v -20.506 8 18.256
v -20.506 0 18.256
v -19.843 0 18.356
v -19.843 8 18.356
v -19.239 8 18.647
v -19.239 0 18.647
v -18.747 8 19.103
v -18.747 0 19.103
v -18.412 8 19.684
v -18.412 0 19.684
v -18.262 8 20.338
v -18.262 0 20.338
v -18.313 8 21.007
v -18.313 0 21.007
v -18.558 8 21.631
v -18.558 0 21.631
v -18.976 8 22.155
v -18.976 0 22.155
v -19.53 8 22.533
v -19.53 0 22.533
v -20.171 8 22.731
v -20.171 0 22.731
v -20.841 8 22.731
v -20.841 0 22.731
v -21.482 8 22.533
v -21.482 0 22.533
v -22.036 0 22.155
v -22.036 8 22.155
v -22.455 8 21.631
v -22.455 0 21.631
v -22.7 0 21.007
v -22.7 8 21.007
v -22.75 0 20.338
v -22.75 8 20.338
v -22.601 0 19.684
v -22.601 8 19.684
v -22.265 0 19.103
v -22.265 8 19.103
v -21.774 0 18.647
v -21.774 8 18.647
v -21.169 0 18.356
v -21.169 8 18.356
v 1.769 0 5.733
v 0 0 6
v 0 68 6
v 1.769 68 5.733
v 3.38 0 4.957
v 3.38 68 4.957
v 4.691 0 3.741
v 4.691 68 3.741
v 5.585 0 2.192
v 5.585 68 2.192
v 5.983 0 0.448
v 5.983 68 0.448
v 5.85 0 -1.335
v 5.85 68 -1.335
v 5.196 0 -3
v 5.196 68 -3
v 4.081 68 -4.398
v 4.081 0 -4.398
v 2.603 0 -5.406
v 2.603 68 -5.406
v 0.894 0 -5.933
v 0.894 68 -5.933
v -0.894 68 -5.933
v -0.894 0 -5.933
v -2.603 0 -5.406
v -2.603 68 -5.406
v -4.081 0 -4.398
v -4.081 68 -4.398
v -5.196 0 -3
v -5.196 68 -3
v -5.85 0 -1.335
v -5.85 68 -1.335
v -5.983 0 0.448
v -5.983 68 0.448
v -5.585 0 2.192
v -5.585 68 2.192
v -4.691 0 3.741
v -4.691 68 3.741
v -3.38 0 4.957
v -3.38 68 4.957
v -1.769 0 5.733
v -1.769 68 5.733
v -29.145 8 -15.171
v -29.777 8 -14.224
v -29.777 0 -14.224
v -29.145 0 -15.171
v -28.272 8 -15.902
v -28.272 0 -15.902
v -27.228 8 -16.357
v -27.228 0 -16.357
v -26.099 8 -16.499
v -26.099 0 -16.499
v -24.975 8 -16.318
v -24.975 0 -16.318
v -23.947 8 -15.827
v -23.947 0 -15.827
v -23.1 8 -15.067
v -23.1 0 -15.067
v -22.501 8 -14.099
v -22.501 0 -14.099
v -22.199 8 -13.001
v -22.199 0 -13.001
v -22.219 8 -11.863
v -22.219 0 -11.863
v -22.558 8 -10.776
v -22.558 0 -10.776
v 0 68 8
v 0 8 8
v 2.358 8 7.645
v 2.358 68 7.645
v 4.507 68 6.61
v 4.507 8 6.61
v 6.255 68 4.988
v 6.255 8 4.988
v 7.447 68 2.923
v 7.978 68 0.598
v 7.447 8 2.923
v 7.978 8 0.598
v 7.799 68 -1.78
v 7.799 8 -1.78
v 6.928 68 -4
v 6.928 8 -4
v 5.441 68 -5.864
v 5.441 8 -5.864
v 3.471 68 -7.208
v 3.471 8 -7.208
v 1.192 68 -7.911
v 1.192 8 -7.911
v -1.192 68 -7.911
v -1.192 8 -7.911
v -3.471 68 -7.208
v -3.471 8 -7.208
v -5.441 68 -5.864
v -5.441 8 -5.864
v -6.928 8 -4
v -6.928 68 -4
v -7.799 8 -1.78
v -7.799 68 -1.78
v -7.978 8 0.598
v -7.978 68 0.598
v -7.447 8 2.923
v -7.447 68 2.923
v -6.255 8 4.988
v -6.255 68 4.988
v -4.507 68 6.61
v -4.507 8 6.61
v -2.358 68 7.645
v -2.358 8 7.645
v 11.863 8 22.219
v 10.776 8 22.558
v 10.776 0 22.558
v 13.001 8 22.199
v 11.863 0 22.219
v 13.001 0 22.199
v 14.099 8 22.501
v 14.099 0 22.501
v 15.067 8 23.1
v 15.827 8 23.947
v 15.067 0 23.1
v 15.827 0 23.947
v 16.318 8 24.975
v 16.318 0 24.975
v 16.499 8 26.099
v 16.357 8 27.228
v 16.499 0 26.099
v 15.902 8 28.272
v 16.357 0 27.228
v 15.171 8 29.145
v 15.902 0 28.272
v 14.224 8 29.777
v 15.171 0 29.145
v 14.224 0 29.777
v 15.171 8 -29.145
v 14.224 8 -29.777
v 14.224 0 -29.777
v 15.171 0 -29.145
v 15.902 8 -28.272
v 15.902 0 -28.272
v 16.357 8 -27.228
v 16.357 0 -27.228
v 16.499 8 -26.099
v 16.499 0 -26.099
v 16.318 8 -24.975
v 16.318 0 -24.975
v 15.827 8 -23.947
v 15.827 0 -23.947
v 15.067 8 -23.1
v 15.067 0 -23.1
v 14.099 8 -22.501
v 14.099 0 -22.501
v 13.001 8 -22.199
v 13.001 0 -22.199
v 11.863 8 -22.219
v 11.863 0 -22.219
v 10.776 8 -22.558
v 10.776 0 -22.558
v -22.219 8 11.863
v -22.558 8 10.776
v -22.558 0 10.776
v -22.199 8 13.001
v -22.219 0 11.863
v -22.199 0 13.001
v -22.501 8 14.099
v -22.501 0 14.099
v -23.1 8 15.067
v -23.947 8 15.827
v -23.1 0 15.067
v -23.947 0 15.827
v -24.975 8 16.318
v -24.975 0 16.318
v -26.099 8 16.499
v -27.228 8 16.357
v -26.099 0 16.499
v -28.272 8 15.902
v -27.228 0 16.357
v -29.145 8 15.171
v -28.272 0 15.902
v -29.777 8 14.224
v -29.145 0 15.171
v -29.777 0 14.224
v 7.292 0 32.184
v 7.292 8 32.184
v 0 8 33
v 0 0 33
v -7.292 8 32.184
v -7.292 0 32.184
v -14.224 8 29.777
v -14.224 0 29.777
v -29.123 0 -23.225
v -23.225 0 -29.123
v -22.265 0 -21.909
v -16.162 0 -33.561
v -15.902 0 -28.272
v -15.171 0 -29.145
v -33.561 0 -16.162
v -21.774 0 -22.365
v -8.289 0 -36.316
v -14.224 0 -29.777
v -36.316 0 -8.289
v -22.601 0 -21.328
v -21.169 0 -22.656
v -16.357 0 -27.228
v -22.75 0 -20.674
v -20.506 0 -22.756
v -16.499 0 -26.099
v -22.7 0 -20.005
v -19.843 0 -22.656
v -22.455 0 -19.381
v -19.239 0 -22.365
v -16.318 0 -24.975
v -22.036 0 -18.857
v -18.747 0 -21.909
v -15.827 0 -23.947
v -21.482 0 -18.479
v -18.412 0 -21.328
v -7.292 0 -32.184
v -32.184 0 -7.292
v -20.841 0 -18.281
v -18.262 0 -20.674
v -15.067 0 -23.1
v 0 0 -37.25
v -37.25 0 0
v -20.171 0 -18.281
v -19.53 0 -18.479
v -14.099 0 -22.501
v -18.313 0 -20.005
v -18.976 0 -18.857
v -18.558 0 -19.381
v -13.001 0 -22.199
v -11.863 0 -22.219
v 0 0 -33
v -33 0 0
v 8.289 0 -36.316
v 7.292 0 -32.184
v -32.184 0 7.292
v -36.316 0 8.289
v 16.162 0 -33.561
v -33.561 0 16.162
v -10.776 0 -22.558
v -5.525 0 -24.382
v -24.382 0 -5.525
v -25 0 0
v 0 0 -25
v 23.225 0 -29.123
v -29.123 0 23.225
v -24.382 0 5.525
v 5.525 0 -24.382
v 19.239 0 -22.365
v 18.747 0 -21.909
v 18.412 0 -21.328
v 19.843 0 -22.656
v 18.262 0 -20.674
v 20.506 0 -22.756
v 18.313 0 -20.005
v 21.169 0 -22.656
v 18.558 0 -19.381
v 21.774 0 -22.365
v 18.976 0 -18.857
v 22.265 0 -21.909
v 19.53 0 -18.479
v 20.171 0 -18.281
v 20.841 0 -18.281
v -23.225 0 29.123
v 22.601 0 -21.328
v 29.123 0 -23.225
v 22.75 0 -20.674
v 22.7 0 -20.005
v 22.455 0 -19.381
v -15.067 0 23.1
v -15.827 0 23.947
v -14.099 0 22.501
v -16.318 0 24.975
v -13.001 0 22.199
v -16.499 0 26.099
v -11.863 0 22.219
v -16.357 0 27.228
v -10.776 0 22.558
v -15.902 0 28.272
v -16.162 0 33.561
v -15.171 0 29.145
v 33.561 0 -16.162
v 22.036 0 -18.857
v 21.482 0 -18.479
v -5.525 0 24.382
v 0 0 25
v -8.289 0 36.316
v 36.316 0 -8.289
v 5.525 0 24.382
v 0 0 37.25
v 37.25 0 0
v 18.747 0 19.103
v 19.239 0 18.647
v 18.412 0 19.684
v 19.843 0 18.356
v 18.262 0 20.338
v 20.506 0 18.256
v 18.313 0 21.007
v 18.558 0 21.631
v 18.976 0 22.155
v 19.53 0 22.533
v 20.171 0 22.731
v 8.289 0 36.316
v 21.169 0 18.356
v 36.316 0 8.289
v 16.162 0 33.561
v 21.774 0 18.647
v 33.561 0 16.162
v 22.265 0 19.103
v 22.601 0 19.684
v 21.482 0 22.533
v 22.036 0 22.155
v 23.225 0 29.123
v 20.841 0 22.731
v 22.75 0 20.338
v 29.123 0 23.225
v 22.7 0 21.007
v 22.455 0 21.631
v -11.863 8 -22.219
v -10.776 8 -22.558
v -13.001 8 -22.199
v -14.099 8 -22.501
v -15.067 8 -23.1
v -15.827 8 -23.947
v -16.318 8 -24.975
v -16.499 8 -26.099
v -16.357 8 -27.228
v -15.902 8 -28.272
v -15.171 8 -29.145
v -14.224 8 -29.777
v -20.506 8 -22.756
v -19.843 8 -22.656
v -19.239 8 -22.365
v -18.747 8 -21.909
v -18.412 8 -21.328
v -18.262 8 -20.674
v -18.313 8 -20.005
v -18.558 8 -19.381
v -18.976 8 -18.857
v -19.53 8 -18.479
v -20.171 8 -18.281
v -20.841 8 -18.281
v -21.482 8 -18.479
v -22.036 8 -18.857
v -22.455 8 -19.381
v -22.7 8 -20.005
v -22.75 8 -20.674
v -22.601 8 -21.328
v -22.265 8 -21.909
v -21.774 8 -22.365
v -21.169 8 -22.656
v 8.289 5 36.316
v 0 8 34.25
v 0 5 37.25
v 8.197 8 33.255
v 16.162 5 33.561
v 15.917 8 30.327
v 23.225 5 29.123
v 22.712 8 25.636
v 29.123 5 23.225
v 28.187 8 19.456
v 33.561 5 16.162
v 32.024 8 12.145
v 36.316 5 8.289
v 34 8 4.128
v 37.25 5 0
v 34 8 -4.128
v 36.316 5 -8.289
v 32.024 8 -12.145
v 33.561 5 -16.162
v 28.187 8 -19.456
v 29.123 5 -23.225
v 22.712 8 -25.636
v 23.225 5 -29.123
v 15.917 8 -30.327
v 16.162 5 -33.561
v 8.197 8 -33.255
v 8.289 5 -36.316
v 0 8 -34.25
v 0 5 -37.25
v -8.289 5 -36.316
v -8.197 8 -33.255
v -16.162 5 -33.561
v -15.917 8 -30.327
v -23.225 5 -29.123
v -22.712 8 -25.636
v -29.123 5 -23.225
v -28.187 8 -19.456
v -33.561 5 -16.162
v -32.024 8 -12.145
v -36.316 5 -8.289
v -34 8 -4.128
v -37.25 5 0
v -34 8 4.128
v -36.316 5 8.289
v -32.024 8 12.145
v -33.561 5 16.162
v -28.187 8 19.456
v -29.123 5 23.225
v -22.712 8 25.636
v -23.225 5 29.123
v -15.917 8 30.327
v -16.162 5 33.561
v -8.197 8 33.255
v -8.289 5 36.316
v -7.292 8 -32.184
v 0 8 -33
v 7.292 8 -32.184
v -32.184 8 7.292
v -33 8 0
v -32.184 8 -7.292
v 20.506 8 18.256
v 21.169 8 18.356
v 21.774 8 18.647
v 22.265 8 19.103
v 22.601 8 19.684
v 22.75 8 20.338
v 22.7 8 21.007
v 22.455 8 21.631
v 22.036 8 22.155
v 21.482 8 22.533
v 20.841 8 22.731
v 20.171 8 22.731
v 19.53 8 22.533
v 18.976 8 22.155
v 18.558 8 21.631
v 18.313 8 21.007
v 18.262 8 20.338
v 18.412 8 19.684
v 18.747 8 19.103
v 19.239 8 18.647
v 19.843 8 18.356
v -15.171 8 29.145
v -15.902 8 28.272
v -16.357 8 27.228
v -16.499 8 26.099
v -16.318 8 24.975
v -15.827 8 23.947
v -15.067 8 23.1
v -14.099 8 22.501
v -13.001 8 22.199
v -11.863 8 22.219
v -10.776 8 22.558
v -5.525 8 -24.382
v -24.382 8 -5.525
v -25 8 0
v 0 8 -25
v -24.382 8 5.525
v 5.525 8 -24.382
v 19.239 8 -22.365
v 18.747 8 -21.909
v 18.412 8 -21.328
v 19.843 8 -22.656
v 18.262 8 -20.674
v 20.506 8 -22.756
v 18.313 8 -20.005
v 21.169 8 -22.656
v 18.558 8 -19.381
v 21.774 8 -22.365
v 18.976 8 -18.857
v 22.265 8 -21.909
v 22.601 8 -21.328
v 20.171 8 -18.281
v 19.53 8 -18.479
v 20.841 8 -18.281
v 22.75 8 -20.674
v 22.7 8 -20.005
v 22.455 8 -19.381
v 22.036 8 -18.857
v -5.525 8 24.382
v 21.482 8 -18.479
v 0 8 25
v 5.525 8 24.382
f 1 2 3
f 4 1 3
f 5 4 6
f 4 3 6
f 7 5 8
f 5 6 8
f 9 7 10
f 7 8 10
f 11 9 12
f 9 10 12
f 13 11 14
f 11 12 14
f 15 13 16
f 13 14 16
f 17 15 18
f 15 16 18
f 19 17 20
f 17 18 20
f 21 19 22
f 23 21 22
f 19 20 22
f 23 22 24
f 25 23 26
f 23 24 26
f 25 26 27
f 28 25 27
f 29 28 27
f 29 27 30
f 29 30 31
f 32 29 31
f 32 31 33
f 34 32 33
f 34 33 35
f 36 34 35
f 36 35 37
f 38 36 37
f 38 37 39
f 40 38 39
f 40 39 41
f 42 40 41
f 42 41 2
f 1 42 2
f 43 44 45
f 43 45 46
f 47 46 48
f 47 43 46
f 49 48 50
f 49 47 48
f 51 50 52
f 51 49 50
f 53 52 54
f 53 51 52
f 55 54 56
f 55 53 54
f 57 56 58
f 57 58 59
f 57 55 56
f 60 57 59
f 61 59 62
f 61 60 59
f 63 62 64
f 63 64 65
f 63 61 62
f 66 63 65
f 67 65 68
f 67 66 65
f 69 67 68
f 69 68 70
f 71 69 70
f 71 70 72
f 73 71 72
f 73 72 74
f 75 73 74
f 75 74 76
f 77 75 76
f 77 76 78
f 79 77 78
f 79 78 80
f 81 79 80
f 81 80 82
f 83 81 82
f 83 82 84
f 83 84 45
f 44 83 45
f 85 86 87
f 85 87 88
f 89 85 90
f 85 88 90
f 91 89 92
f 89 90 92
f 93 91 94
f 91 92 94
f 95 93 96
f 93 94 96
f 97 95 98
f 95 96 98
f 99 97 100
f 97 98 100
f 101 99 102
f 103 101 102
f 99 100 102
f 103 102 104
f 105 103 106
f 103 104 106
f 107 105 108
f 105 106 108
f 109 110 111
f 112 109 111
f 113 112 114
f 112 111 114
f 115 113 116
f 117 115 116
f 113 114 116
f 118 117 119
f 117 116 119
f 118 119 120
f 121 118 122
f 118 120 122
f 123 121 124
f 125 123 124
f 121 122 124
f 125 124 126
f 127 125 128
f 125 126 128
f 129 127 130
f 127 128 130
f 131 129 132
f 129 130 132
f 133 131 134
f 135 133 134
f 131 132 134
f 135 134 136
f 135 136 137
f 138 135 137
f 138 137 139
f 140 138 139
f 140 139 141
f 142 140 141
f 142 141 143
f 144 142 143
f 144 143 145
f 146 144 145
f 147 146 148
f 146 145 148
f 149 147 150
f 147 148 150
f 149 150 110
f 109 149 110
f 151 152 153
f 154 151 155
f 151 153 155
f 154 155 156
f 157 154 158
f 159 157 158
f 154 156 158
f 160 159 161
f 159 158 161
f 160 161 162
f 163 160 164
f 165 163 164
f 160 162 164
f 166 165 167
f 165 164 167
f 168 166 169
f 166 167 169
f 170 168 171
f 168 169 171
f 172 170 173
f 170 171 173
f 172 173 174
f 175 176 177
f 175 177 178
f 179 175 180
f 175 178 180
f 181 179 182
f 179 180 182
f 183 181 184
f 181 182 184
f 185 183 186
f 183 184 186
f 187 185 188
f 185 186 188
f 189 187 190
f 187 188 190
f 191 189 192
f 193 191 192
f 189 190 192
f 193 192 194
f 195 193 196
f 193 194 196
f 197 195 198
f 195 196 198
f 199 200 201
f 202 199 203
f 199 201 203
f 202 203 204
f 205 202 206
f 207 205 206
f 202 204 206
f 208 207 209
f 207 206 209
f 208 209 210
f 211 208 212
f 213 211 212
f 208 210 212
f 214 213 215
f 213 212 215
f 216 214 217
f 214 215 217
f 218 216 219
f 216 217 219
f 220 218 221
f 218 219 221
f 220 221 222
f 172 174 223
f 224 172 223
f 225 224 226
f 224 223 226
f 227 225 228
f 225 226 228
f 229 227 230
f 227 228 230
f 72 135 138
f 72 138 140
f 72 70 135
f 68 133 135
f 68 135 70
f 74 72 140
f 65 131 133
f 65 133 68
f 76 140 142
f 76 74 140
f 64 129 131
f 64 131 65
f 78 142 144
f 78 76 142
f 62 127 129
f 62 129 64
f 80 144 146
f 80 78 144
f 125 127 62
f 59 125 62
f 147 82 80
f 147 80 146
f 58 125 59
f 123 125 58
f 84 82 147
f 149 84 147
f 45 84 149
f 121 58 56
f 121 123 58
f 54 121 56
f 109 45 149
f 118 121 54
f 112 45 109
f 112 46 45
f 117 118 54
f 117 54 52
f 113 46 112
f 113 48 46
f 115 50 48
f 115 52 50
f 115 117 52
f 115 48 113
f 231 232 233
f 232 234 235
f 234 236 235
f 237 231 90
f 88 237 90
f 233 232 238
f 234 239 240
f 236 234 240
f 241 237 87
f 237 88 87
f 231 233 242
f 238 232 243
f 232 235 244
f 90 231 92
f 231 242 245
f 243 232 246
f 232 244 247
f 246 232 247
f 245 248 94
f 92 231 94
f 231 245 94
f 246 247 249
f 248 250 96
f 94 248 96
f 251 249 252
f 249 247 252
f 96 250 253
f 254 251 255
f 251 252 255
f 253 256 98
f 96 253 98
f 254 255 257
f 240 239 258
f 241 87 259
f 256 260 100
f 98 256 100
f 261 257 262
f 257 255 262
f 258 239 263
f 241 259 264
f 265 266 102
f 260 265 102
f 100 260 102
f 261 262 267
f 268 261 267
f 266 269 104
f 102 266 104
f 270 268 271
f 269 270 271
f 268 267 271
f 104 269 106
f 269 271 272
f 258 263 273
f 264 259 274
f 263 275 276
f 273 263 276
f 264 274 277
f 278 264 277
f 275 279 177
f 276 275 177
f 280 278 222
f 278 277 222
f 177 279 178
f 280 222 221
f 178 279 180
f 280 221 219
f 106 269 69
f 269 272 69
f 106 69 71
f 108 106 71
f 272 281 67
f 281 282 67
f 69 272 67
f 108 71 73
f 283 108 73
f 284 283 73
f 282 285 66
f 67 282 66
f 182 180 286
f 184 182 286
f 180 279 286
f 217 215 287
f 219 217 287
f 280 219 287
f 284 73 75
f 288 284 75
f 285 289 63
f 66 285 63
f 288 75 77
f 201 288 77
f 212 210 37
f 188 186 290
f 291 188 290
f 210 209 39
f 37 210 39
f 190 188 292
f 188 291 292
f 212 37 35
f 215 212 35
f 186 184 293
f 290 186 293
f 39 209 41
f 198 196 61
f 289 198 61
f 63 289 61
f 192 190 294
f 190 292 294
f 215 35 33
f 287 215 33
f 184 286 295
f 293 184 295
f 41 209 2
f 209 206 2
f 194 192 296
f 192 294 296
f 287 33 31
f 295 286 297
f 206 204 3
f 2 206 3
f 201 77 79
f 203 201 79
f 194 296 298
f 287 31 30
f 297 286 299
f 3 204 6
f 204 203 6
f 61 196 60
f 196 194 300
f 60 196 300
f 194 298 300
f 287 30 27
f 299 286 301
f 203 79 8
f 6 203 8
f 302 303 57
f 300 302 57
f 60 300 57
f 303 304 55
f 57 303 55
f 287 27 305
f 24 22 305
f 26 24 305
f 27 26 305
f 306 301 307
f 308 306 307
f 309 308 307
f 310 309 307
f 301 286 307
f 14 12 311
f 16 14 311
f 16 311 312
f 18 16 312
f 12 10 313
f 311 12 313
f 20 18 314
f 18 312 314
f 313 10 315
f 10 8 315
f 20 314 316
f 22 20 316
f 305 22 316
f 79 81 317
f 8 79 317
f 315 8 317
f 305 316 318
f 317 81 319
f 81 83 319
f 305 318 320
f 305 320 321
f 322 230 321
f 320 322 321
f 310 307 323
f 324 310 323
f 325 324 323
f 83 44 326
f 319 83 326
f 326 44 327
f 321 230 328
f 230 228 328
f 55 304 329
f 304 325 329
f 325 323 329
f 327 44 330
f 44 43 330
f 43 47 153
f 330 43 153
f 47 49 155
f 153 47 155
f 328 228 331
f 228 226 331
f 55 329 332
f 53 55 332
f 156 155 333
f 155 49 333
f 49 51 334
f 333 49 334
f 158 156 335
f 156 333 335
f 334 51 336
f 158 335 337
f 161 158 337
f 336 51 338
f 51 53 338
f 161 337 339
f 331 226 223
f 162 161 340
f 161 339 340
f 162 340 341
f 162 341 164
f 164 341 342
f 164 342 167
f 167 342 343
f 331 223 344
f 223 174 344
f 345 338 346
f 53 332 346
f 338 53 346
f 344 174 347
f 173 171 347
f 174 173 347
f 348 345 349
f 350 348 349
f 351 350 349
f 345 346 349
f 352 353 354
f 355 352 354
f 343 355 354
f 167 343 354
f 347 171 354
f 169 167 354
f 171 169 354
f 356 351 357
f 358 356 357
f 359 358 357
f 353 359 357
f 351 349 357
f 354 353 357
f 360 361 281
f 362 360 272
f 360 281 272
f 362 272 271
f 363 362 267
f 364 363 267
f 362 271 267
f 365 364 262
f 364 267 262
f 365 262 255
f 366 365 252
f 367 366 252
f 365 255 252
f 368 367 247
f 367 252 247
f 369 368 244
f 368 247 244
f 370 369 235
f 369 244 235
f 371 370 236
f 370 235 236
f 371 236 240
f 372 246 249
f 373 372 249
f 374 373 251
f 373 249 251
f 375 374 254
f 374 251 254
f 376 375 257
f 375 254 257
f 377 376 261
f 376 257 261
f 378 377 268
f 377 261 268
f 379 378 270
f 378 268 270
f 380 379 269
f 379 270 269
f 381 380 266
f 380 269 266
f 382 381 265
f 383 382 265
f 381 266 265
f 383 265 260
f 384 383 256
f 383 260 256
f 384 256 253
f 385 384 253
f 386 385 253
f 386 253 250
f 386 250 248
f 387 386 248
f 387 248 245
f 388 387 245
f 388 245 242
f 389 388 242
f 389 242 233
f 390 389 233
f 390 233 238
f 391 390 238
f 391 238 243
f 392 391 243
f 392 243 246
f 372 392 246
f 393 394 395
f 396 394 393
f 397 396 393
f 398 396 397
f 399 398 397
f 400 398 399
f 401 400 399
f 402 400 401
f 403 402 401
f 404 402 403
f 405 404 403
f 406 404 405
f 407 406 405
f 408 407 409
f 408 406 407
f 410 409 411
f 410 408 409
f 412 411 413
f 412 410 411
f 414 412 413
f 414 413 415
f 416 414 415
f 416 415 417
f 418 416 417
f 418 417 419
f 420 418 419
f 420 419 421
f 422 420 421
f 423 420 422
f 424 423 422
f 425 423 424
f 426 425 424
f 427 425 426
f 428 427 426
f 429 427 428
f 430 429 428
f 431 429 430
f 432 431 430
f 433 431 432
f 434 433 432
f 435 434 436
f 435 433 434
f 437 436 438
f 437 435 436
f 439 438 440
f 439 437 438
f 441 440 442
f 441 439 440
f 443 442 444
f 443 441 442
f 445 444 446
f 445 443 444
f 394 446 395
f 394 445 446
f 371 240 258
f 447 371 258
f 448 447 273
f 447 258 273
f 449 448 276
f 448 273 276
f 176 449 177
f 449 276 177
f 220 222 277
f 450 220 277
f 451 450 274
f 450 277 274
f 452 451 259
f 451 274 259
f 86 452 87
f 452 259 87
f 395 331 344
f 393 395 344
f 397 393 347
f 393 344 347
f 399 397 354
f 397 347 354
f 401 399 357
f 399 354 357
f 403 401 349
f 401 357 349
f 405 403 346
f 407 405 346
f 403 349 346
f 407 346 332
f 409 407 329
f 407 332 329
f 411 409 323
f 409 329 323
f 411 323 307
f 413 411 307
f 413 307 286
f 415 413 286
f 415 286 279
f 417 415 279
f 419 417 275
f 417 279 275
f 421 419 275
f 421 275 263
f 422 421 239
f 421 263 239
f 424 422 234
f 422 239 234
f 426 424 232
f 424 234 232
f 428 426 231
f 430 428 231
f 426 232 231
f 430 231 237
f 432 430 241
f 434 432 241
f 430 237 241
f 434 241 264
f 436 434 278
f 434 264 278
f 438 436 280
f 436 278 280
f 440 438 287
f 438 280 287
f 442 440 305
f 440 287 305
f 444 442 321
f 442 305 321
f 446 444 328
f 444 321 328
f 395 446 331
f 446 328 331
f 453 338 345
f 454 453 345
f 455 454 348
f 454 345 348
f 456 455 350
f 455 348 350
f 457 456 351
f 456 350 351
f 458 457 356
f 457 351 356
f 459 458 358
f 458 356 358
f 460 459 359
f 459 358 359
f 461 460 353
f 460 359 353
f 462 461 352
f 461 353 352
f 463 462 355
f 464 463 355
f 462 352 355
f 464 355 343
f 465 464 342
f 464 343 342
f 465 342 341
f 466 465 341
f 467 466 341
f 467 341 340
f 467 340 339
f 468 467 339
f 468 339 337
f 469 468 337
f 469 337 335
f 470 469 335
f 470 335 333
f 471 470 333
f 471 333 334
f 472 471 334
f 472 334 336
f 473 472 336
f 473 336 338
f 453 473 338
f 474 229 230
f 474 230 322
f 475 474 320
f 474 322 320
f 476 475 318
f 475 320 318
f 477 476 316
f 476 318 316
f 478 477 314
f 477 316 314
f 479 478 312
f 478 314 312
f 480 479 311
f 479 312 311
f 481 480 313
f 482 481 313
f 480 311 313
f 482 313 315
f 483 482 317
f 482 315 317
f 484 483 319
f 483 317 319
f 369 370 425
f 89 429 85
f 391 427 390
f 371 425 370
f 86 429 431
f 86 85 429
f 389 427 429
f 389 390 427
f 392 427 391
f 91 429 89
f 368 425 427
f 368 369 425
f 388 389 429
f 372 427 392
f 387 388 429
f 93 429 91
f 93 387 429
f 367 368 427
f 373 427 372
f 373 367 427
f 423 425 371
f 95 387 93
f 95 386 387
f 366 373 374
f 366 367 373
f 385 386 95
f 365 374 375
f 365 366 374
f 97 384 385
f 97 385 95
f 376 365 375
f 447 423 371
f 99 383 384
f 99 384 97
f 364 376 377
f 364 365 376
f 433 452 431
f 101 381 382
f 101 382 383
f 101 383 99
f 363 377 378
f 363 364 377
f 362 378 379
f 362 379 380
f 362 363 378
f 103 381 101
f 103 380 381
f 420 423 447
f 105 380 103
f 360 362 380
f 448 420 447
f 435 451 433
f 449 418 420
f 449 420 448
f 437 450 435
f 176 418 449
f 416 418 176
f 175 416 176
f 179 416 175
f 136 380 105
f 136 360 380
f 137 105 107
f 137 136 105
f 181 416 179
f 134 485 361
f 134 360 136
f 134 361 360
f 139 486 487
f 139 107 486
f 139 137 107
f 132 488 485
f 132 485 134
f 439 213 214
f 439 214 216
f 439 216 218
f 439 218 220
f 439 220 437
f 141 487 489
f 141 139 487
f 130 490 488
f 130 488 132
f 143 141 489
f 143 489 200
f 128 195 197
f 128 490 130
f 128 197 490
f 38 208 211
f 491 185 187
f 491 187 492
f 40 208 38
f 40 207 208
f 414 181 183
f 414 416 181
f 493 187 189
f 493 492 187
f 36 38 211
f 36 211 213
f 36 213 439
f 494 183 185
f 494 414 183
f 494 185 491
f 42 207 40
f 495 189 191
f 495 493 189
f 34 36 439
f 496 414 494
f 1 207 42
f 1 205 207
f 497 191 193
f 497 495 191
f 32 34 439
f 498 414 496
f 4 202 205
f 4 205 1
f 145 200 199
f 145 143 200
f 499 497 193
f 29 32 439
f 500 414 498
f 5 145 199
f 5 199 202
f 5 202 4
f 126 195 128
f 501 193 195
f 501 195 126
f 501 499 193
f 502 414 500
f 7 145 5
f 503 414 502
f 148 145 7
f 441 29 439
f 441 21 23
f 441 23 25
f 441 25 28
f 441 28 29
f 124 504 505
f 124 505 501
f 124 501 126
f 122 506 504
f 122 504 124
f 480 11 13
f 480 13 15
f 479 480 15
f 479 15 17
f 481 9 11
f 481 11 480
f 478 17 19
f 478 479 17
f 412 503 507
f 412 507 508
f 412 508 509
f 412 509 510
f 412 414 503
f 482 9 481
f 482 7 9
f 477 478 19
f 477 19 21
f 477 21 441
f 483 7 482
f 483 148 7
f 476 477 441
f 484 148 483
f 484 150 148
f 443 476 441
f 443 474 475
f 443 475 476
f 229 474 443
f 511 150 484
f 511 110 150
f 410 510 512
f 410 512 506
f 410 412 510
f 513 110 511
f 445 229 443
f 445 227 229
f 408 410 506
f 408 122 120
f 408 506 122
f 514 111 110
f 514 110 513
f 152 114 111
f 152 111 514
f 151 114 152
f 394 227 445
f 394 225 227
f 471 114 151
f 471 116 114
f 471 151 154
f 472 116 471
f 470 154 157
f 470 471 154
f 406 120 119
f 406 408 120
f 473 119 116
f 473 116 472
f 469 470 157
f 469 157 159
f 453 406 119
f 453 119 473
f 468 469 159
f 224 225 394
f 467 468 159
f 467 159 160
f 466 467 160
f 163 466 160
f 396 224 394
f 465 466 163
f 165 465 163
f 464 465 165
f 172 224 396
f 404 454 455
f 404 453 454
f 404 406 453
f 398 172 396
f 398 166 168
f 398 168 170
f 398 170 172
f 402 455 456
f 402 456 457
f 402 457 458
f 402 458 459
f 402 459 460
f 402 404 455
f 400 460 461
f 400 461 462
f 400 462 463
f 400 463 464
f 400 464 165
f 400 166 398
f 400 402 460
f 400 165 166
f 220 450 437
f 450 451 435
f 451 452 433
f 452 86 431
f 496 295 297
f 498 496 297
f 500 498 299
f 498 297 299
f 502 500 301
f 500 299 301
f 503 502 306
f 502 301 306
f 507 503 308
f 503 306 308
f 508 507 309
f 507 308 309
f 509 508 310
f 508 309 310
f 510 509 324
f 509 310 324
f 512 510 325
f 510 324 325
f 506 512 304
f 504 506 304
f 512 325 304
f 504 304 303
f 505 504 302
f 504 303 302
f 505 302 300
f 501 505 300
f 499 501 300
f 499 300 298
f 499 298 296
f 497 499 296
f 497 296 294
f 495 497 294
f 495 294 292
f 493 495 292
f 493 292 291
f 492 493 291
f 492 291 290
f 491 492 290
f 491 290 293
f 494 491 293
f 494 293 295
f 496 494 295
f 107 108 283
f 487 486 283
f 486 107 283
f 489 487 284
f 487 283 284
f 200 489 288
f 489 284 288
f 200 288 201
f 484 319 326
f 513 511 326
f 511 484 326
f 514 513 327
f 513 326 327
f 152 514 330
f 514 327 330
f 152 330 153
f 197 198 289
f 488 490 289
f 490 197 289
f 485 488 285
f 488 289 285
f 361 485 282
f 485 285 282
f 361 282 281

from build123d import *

# Parameters (mm, degrees)
SKETCH1_R           = 37.25
BOSS_EXTRUDE1_DEPTH = 8
SKETCH2_R           = 8
SKETCH2_R_2         = 6
BOSS_EXTRUDE2_DEPTH = 60
CHAMFER1_SIZE       = 3
CUT_EXTRUDE1_START  = -10
SKETCH3_R           = 6
CUT_EXTRUDE1_DEPTH  = 10
SKETCH4_R           = 2.25
CUT_EXTRUDE2_DEPTH  = 10


with BuildPart() as part:
    # Sketch1 → Boss-Extrude1 (new body)
    with BuildSketch(Plane(origin=(0, 0, 0), x_dir=(1, 0, 0), z_dir=(0, 1, 0))):
        with Locations(Location((0, 0, 0), (0, 0, 270))):
            Circle(SKETCH1_R)
    extrude(amount=BOSS_EXTRUDE1_DEPTH)

    # Sketch2 → Boss-Extrude2 (add)
    with BuildSketch(Plane(origin=(0, 8, 0), x_dir=(1, 0, 0), z_dir=(0, 1, 0))):
        with Locations(Location((0, 0, 0), (0, 0, 270))):
            Circle(SKETCH2_R)
        with Locations(Location((0, 0, 0), (0, 0, 270))):
            Circle(SKETCH2_R_2, mode=Mode.SUBTRACT)
    extrude(amount=BOSS_EXTRUDE2_DEPTH)

    # Chamfer1
    chamfer1_edges = [part.edges().sort_by_distance(p)[0] for p in [
        (0, 8, -37.25),
    ]]
    chamfer(chamfer1_edges, length=CHAMFER1_SIZE)

    # Sketch3 → Cut-Extrude1 (cut)
    with BuildSketch(Plane(origin=(0, 8, 0), x_dir=(1, 0, 0), z_dir=(0, 1, 0)).offset(CUT_EXTRUDE1_START)):
        with Locations(Location((0, 0, 0), (0, 0, 270))):
            Circle(SKETCH3_R)
    extrude(amount=CUT_EXTRUDE1_DEPTH, mode=Mode.SUBTRACT)

    # Sketch4 → Cut-Extrude2 (cut)
    with BuildSketch(Plane(origin=(0, 0, 0), x_dir=(-1, 0, 0), z_dir=(0, -1, 0))):
        with Locations(Location((20.506096654, 20.506096654, 0), (0, 0, 90))):
            Circle(SKETCH4_R)
        with Locations(Location((20.506096654, -20.506096654, 0), (0, 0, 90))):
            Circle(SKETCH4_R)
        with Locations(Location((-20.506096654, -20.506096654, 0), (0, 0, 90))):
            Circle(SKETCH4_R)
        with Locations(Location((-20.506096654, 20.506096654, 0), (0, 0, 90))):
            Circle(SKETCH4_R)
        with BuildLine():
            ThreePointArc((29.777070039, -14.224137931), (33, 0), (29.777070039, 14.224137931))
            ThreePointArc((29.777070039, 14.224137931), (24.443590285, 16.109341823), (22.558386393, 10.775862069))
            ThreePointArc((22.558386393, 10.775862069), (25, 0), (22.558386393, -10.775862069))
            ThreePointArc((22.558386393, -10.775862069), (24.443590285, -16.109341823), (29.777070039, -14.224137931))
        make_face()
        with BuildLine():
            ThreePointArc((-14.224137931, -29.777070039), (0, -33), (14.224137931, -29.777070039))
            ThreePointArc((14.224137931, -29.777070039), (16.109341823, -24.443590285), (10.775862069, -22.558386393))
            ThreePointArc((10.775862069, -22.558386393), (0, -25), (-10.775862069, -22.558386393))
            ThreePointArc((-10.775862069, -22.558386393), (-16.109341823, -24.443590285), (-14.224137931, -29.777070039))
        make_face()
        with BuildLine():
            ThreePointArc((14.224137931, 29.777070039), (0, 33), (-14.224137931, 29.777070039))
            ThreePointArc((-14.224137931, 29.777070039), (-16.109341823, 24.443590285), (-10.775862069, 22.558386393))
            ThreePointArc((-10.775862069, 22.558386393), (0, 25), (10.775862069, 22.558386393))
            ThreePointArc((10.775862069, 22.558386393), (16.109341823, 24.443590285), (14.224137931, 29.777070039))
        make_face()
    extrude(amount=-CUT_EXTRUDE2_DEPTH, mode=Mode.SUBTRACT)


solid = part.part
